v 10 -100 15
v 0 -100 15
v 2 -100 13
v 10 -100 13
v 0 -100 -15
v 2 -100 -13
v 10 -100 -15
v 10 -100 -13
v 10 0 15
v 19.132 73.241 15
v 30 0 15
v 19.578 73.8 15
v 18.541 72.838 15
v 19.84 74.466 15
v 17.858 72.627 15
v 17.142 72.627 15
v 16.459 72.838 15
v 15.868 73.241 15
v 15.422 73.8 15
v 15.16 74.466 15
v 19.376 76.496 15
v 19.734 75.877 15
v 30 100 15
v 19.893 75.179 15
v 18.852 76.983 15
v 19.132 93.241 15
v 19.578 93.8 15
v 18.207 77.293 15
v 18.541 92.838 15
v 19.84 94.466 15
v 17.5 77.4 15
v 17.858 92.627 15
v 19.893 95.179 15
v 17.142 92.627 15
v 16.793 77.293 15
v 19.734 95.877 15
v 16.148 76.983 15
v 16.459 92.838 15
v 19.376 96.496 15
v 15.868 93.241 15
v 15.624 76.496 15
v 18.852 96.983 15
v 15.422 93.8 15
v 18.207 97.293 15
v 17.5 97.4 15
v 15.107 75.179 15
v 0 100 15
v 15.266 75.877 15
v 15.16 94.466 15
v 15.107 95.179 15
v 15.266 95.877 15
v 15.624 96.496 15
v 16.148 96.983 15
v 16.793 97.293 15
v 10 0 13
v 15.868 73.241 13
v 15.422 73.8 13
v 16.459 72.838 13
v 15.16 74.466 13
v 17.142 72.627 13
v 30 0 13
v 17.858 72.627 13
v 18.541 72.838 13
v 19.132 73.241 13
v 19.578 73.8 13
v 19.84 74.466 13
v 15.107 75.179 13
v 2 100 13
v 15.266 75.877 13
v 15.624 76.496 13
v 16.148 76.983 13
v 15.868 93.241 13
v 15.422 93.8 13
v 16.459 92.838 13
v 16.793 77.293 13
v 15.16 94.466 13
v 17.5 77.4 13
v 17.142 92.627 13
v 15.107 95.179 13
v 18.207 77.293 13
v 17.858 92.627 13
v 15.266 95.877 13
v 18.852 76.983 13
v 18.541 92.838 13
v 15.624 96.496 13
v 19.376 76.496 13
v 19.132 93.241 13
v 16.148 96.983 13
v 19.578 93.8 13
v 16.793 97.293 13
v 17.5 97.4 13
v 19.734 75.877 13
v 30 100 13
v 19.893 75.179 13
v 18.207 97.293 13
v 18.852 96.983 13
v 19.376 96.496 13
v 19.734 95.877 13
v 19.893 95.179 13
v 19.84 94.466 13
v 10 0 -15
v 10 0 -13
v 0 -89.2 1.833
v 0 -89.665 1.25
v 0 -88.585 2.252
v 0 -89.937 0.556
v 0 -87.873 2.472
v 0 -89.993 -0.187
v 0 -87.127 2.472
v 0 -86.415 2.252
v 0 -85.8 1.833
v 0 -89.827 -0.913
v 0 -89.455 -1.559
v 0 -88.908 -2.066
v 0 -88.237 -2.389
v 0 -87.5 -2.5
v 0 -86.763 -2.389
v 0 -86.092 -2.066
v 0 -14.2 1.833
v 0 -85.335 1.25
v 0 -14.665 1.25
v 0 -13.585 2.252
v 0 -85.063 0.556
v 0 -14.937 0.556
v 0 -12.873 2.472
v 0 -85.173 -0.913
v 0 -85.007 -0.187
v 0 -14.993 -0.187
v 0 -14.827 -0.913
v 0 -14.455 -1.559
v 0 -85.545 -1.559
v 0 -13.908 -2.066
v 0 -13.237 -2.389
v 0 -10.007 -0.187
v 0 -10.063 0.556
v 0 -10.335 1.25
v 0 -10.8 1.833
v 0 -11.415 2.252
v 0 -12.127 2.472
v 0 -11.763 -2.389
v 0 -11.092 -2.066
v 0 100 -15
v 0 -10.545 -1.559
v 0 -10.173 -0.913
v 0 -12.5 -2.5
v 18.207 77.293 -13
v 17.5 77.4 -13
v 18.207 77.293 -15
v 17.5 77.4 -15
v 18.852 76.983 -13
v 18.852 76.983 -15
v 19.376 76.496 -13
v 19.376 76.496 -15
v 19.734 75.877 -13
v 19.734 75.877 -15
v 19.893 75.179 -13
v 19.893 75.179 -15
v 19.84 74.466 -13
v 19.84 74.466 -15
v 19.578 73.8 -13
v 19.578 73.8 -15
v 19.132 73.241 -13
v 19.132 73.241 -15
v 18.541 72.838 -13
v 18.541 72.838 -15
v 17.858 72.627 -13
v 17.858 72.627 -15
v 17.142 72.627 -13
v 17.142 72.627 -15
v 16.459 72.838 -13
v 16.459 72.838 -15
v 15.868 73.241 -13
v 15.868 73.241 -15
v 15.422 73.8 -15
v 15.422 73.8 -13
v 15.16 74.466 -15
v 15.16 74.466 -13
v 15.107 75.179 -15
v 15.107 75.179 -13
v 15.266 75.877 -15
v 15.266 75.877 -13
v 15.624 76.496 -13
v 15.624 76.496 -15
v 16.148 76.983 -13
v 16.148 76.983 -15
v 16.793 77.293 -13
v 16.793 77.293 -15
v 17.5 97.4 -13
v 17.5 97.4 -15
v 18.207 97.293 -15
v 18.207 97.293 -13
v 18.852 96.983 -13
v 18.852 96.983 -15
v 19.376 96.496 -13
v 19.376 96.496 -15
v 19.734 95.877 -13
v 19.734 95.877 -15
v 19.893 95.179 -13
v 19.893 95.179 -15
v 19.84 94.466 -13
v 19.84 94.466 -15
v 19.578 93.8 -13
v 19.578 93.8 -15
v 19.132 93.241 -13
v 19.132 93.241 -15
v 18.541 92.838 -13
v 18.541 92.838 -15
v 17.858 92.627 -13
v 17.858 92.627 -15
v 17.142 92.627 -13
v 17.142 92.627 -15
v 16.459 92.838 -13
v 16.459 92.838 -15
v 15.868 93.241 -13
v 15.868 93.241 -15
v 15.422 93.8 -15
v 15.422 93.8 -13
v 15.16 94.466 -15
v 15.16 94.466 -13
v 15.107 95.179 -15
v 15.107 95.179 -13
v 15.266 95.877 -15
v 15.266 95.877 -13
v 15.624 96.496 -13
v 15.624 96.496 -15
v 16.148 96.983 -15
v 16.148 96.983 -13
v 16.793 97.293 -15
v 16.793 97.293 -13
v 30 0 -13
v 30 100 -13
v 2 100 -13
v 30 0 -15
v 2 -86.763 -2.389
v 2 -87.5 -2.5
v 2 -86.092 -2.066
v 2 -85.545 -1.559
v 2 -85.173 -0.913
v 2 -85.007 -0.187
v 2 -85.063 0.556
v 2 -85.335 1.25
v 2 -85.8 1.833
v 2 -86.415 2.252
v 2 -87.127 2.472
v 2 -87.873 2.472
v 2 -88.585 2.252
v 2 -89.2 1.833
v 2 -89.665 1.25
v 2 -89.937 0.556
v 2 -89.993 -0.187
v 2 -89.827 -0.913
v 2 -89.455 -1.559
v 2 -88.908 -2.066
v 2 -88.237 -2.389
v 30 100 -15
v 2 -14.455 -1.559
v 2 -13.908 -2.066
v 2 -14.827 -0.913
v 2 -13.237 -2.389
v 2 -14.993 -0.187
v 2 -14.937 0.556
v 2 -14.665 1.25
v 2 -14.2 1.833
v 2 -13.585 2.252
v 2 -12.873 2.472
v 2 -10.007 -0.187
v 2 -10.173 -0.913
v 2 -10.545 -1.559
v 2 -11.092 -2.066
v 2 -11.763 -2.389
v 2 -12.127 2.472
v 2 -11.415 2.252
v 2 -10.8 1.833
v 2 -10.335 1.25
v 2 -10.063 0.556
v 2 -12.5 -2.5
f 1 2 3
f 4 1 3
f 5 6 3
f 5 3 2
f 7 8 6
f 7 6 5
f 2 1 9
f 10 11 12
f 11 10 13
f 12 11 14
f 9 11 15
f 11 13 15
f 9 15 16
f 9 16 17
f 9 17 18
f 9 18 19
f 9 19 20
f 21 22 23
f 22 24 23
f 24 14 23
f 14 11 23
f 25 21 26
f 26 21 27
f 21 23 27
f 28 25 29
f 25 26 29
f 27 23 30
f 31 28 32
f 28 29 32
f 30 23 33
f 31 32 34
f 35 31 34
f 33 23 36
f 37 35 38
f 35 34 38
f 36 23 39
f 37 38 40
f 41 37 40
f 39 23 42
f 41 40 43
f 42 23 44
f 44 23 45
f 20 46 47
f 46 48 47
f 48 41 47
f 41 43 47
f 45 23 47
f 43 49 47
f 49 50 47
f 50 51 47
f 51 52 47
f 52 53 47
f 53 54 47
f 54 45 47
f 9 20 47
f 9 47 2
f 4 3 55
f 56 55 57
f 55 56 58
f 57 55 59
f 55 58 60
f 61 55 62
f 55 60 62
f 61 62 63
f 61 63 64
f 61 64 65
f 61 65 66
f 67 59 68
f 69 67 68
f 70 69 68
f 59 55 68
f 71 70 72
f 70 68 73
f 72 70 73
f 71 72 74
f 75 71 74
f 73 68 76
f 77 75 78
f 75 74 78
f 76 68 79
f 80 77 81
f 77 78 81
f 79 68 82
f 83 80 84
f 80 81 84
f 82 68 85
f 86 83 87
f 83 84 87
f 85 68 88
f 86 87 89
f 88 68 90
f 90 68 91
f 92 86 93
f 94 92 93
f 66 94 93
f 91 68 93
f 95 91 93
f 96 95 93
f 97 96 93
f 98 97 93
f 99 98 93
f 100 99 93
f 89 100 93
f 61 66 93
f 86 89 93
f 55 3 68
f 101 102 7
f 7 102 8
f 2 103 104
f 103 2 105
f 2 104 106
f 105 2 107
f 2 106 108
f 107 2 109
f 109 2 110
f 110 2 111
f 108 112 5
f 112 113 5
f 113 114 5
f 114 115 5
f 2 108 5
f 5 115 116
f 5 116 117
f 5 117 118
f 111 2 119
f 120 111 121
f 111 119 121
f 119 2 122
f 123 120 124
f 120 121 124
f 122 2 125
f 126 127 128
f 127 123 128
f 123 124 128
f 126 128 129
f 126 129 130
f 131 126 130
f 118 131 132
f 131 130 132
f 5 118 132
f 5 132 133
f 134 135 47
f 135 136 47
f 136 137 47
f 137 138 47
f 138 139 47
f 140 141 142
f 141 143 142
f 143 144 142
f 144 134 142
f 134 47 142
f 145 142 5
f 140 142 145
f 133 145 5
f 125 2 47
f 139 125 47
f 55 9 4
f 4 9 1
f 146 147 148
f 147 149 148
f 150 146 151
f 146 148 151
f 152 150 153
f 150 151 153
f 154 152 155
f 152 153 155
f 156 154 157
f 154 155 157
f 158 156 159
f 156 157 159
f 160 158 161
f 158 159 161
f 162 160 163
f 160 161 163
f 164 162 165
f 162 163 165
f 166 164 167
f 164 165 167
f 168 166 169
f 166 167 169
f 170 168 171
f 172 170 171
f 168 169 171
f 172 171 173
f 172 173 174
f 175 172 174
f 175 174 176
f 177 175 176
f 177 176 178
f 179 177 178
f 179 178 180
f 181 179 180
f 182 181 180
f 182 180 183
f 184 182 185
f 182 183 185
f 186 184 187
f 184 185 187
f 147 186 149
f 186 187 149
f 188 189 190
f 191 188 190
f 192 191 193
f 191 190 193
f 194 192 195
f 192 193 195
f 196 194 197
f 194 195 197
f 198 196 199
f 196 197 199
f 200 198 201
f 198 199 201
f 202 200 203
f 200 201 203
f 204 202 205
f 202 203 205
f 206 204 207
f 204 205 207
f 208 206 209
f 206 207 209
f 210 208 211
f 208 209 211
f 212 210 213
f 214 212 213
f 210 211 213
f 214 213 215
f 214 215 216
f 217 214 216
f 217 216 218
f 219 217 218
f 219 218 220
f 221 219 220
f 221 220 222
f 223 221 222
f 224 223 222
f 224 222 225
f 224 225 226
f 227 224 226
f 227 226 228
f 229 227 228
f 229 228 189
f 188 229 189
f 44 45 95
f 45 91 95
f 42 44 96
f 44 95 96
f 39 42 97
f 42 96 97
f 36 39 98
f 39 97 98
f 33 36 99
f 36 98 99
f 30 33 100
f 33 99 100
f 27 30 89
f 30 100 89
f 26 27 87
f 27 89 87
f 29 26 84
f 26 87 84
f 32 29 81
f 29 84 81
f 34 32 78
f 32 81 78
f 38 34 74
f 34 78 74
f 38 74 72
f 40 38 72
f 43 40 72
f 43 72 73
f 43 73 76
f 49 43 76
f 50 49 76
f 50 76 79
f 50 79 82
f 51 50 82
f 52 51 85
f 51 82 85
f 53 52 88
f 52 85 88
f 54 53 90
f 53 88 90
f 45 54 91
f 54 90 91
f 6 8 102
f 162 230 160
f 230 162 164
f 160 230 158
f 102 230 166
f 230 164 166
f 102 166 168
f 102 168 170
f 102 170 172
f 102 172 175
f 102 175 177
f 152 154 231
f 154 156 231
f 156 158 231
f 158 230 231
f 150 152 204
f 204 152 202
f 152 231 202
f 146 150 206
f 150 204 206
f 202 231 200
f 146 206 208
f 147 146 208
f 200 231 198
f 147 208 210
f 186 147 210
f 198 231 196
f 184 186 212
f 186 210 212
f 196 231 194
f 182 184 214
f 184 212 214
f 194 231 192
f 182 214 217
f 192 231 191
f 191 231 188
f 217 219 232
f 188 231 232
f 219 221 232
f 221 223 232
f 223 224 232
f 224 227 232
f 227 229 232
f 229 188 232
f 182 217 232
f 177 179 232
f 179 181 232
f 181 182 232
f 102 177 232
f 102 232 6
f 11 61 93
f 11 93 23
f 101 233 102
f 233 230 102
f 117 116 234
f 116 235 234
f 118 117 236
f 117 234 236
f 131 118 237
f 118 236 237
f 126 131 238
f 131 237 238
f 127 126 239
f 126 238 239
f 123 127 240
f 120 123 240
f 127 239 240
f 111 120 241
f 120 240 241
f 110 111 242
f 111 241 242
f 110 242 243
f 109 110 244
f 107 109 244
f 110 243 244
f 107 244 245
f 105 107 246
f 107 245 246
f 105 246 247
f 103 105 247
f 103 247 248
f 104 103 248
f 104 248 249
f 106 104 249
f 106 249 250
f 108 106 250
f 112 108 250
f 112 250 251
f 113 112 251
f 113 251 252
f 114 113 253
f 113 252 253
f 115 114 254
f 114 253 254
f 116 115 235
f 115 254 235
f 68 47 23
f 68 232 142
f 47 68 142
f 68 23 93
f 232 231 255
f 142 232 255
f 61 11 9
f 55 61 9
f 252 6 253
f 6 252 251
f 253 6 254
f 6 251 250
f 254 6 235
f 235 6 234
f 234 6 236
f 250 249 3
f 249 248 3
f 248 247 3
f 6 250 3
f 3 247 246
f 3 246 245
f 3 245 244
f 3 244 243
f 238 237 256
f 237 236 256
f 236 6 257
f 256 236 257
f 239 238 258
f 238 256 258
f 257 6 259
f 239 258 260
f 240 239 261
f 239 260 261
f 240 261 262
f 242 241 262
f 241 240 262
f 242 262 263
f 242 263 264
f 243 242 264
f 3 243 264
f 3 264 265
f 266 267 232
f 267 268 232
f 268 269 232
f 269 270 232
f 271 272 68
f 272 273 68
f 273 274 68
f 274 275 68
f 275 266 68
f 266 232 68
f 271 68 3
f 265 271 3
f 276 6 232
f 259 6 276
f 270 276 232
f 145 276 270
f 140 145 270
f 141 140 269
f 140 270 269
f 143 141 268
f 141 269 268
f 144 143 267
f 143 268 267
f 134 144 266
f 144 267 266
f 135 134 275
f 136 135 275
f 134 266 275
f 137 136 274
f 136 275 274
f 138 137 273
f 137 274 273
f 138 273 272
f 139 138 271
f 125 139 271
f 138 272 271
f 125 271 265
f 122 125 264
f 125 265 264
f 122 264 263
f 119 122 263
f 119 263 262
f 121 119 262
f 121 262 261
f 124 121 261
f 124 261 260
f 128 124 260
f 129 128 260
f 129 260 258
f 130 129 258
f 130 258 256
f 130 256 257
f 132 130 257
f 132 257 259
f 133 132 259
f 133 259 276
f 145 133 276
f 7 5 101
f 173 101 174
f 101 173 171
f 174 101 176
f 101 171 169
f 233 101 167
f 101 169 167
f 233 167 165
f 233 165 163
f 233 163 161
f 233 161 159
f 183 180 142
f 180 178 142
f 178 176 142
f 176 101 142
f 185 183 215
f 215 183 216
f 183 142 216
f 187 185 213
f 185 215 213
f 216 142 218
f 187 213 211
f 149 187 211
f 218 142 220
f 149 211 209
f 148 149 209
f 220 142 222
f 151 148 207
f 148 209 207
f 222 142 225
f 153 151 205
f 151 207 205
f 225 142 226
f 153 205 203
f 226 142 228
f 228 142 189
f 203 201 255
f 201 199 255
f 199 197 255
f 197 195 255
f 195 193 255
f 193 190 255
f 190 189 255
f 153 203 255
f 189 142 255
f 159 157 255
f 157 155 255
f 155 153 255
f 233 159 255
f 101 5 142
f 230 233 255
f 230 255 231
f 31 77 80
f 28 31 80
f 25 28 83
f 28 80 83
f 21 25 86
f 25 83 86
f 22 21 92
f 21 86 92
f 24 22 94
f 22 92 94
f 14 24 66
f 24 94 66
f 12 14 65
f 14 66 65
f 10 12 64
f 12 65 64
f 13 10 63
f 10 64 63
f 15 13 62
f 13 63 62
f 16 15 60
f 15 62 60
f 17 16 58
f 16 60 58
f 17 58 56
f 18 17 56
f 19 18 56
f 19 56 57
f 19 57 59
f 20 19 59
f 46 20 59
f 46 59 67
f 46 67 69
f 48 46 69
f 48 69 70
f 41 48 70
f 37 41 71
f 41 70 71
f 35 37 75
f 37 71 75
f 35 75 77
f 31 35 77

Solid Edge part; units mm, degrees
sketch "Sketch1" plane through (0, 0, 0) normal (0, -1, 0) x (1, 0, 0)
  line L0 (0, 15) -> (0, -15)
  line L1 (0, -15) -> (30, -15)
  line L2 (30, -15) -> (30, -13)
  line L3 (30, -13) -> (2, -13)
  line L4 (2, -13) -> (2, 13)
  line L5 (2, 13) -> (30, 13)
  line L6 (30, 13) -> (30, 15)
  line L7 (30, 15) -> (0, 15)
  dimension "D1" = 2
  dimension "D2" = 30
  dimension "D3" = 28
extrude "Protrusion1" add sketch "Sketch1" along normal mid plane 200
sketch "Sketch2" plane through (15, 0, 15) normal (0, 0, 1) x (0, -1, 0)
  line L0 (0, 15) -> (0, -5)
  line L1 (0, -5) -> (100, -5)
  line L2 (100, -5) -> (100, 15)
  line L3 (100, 15) -> (0, 15)
  dimension "D1" = 20
extrude "Cutout1" cut sketch "Sketch2" against normal through all
hole "Hole_1" at (2, -87.5, 0) direction (-1, 0, 0) diameter 5 end up to next
hole "Hole1" at (2, -12.5, 0) direction (-1, 0, 0) diameter 5 end up to next
hole "Hole_3" at (17.5, 95, -15) direction (0, 0, 1) diameter 4.8 end through all
hole "Hole2" at (17.5, 75, -15) direction (0, 0, 1) diameter 4.8 end through all
properties material "Aluminum, 1060"
